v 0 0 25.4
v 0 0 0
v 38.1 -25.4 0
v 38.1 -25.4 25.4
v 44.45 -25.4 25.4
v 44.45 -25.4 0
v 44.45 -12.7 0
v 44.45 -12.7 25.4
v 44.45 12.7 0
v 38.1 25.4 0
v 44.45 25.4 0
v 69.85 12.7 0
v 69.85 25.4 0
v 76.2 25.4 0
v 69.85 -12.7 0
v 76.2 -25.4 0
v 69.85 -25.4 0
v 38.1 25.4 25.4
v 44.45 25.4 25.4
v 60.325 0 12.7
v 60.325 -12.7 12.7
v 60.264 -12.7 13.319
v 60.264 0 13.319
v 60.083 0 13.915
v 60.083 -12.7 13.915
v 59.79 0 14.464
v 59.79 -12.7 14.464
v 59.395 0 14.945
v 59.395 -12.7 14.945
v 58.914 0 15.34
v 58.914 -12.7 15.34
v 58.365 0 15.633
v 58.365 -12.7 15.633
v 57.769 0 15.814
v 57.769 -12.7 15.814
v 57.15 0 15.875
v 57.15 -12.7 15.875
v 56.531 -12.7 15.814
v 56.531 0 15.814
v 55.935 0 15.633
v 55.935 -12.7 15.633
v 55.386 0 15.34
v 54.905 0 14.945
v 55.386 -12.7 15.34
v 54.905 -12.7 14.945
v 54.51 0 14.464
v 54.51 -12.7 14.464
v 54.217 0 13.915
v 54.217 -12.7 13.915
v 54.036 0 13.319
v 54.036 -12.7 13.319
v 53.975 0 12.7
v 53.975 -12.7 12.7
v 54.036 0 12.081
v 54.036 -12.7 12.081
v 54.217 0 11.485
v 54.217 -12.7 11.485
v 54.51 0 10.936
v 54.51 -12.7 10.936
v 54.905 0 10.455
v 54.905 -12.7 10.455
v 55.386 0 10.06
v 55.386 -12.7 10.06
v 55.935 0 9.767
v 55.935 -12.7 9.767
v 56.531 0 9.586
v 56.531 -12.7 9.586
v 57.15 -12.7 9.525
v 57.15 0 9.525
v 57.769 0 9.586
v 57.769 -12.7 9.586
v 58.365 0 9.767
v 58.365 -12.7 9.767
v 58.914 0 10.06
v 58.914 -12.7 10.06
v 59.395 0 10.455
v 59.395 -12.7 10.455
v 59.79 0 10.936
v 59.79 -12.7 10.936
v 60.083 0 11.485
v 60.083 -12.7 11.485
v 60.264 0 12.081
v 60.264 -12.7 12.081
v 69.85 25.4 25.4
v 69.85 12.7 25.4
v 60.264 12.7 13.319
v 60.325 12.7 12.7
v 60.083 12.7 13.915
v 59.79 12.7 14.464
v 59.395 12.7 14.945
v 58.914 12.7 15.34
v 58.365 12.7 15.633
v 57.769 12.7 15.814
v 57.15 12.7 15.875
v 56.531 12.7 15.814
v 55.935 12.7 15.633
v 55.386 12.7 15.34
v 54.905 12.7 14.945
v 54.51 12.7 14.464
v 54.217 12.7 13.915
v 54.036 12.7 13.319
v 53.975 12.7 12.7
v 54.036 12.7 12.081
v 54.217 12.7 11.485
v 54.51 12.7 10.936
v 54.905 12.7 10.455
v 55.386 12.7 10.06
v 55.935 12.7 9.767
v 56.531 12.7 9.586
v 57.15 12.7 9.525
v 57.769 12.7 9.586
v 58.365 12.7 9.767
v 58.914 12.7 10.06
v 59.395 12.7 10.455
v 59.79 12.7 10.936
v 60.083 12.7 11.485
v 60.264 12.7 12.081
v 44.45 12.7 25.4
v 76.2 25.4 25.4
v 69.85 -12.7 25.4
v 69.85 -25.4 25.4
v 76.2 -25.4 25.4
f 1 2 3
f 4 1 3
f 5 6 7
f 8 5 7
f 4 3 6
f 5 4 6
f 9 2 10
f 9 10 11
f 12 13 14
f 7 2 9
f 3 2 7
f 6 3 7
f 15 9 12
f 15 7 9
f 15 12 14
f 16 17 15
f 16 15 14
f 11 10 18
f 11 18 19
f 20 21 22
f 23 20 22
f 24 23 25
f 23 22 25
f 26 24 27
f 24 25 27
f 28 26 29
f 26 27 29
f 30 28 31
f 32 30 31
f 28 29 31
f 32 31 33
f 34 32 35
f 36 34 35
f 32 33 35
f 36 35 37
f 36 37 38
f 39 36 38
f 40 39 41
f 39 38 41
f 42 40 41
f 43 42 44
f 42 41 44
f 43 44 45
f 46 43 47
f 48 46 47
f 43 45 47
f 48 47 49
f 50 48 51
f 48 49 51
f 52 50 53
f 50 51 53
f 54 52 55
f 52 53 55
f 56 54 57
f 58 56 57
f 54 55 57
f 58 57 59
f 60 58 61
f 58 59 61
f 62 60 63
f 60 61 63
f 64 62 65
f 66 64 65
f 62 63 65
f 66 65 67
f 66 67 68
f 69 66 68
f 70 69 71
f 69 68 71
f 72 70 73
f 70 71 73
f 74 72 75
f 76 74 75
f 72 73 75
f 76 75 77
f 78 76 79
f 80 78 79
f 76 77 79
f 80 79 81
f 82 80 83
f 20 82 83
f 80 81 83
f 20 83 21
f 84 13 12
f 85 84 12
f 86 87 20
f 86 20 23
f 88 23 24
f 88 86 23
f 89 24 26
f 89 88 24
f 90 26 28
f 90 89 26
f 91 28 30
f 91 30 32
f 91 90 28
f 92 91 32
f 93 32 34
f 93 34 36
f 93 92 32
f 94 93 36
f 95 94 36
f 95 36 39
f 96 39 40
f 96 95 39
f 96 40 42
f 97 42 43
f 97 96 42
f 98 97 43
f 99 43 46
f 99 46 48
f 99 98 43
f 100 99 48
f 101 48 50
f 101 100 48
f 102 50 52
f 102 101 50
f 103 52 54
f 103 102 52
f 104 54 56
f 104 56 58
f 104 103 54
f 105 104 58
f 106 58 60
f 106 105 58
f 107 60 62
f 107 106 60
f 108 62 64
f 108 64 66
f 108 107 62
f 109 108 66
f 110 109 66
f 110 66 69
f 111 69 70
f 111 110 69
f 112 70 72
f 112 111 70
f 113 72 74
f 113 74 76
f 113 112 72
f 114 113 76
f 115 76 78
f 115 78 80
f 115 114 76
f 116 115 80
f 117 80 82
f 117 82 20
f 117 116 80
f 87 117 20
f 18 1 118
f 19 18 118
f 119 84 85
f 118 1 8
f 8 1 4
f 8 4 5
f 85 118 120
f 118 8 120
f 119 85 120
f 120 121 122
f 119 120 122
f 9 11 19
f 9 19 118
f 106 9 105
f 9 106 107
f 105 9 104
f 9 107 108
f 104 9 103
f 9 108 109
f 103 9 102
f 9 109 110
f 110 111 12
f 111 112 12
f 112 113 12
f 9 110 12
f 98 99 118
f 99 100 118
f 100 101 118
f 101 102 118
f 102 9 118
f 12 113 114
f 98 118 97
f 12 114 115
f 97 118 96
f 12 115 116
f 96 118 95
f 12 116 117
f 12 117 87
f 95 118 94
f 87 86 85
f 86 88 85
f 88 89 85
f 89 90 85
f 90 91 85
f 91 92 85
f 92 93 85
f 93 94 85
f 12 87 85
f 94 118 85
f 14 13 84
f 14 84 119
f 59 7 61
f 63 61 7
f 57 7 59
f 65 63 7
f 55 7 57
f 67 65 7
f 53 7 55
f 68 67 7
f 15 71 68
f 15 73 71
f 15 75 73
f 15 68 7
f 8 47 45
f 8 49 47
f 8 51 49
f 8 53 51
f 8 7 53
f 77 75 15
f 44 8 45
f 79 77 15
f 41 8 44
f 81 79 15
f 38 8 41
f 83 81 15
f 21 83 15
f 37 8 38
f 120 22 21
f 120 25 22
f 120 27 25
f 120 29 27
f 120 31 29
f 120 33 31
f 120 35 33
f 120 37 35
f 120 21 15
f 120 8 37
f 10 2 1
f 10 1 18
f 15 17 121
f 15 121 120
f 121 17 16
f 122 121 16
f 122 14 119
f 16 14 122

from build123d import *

# Parameters (mm, degrees)
F1_DEPTH = 25.4
F2_W     = 25.4
F2_H     = 12.7
F3_DEPTH = 25.4
F4_R     = 3.175
F5_DEPTH = 12.7


with BuildPart() as f1:
    # F0 (on Top) → F1 (new body)
    with BuildSketch(Plane.XY):
        Polygon((76.2, 0), (0, 0), (38.1, -25.4), (76.2, -25.4), align=None)
    extrude(amount=F1_DEPTH)

    # F2 (on face) → F3 (cut)
    with BuildSketch(Plane.XY.offset(25.4)):
        with Locations((57.15, -19.05)):
            Rectangle(F2_W, F2_H)
    extrude(amount=-F3_DEPTH, mode=Mode.SUBTRACT)

    # F4 (on face) → F5 (cut)
    with BuildSketch(Plane.XZ.offset(12.7)):
        with Locations((57.15, 12.7)):
            Circle(F4_R)
    extrude(amount=-F5_DEPTH, mode=Mode.SUBTRACT)

    # F6: F1 across plane


with BuildPart() as f1_1:
    add(f1.part)
    add(f1.part.mirror(Plane.XZ))


solid = f1_1.part
